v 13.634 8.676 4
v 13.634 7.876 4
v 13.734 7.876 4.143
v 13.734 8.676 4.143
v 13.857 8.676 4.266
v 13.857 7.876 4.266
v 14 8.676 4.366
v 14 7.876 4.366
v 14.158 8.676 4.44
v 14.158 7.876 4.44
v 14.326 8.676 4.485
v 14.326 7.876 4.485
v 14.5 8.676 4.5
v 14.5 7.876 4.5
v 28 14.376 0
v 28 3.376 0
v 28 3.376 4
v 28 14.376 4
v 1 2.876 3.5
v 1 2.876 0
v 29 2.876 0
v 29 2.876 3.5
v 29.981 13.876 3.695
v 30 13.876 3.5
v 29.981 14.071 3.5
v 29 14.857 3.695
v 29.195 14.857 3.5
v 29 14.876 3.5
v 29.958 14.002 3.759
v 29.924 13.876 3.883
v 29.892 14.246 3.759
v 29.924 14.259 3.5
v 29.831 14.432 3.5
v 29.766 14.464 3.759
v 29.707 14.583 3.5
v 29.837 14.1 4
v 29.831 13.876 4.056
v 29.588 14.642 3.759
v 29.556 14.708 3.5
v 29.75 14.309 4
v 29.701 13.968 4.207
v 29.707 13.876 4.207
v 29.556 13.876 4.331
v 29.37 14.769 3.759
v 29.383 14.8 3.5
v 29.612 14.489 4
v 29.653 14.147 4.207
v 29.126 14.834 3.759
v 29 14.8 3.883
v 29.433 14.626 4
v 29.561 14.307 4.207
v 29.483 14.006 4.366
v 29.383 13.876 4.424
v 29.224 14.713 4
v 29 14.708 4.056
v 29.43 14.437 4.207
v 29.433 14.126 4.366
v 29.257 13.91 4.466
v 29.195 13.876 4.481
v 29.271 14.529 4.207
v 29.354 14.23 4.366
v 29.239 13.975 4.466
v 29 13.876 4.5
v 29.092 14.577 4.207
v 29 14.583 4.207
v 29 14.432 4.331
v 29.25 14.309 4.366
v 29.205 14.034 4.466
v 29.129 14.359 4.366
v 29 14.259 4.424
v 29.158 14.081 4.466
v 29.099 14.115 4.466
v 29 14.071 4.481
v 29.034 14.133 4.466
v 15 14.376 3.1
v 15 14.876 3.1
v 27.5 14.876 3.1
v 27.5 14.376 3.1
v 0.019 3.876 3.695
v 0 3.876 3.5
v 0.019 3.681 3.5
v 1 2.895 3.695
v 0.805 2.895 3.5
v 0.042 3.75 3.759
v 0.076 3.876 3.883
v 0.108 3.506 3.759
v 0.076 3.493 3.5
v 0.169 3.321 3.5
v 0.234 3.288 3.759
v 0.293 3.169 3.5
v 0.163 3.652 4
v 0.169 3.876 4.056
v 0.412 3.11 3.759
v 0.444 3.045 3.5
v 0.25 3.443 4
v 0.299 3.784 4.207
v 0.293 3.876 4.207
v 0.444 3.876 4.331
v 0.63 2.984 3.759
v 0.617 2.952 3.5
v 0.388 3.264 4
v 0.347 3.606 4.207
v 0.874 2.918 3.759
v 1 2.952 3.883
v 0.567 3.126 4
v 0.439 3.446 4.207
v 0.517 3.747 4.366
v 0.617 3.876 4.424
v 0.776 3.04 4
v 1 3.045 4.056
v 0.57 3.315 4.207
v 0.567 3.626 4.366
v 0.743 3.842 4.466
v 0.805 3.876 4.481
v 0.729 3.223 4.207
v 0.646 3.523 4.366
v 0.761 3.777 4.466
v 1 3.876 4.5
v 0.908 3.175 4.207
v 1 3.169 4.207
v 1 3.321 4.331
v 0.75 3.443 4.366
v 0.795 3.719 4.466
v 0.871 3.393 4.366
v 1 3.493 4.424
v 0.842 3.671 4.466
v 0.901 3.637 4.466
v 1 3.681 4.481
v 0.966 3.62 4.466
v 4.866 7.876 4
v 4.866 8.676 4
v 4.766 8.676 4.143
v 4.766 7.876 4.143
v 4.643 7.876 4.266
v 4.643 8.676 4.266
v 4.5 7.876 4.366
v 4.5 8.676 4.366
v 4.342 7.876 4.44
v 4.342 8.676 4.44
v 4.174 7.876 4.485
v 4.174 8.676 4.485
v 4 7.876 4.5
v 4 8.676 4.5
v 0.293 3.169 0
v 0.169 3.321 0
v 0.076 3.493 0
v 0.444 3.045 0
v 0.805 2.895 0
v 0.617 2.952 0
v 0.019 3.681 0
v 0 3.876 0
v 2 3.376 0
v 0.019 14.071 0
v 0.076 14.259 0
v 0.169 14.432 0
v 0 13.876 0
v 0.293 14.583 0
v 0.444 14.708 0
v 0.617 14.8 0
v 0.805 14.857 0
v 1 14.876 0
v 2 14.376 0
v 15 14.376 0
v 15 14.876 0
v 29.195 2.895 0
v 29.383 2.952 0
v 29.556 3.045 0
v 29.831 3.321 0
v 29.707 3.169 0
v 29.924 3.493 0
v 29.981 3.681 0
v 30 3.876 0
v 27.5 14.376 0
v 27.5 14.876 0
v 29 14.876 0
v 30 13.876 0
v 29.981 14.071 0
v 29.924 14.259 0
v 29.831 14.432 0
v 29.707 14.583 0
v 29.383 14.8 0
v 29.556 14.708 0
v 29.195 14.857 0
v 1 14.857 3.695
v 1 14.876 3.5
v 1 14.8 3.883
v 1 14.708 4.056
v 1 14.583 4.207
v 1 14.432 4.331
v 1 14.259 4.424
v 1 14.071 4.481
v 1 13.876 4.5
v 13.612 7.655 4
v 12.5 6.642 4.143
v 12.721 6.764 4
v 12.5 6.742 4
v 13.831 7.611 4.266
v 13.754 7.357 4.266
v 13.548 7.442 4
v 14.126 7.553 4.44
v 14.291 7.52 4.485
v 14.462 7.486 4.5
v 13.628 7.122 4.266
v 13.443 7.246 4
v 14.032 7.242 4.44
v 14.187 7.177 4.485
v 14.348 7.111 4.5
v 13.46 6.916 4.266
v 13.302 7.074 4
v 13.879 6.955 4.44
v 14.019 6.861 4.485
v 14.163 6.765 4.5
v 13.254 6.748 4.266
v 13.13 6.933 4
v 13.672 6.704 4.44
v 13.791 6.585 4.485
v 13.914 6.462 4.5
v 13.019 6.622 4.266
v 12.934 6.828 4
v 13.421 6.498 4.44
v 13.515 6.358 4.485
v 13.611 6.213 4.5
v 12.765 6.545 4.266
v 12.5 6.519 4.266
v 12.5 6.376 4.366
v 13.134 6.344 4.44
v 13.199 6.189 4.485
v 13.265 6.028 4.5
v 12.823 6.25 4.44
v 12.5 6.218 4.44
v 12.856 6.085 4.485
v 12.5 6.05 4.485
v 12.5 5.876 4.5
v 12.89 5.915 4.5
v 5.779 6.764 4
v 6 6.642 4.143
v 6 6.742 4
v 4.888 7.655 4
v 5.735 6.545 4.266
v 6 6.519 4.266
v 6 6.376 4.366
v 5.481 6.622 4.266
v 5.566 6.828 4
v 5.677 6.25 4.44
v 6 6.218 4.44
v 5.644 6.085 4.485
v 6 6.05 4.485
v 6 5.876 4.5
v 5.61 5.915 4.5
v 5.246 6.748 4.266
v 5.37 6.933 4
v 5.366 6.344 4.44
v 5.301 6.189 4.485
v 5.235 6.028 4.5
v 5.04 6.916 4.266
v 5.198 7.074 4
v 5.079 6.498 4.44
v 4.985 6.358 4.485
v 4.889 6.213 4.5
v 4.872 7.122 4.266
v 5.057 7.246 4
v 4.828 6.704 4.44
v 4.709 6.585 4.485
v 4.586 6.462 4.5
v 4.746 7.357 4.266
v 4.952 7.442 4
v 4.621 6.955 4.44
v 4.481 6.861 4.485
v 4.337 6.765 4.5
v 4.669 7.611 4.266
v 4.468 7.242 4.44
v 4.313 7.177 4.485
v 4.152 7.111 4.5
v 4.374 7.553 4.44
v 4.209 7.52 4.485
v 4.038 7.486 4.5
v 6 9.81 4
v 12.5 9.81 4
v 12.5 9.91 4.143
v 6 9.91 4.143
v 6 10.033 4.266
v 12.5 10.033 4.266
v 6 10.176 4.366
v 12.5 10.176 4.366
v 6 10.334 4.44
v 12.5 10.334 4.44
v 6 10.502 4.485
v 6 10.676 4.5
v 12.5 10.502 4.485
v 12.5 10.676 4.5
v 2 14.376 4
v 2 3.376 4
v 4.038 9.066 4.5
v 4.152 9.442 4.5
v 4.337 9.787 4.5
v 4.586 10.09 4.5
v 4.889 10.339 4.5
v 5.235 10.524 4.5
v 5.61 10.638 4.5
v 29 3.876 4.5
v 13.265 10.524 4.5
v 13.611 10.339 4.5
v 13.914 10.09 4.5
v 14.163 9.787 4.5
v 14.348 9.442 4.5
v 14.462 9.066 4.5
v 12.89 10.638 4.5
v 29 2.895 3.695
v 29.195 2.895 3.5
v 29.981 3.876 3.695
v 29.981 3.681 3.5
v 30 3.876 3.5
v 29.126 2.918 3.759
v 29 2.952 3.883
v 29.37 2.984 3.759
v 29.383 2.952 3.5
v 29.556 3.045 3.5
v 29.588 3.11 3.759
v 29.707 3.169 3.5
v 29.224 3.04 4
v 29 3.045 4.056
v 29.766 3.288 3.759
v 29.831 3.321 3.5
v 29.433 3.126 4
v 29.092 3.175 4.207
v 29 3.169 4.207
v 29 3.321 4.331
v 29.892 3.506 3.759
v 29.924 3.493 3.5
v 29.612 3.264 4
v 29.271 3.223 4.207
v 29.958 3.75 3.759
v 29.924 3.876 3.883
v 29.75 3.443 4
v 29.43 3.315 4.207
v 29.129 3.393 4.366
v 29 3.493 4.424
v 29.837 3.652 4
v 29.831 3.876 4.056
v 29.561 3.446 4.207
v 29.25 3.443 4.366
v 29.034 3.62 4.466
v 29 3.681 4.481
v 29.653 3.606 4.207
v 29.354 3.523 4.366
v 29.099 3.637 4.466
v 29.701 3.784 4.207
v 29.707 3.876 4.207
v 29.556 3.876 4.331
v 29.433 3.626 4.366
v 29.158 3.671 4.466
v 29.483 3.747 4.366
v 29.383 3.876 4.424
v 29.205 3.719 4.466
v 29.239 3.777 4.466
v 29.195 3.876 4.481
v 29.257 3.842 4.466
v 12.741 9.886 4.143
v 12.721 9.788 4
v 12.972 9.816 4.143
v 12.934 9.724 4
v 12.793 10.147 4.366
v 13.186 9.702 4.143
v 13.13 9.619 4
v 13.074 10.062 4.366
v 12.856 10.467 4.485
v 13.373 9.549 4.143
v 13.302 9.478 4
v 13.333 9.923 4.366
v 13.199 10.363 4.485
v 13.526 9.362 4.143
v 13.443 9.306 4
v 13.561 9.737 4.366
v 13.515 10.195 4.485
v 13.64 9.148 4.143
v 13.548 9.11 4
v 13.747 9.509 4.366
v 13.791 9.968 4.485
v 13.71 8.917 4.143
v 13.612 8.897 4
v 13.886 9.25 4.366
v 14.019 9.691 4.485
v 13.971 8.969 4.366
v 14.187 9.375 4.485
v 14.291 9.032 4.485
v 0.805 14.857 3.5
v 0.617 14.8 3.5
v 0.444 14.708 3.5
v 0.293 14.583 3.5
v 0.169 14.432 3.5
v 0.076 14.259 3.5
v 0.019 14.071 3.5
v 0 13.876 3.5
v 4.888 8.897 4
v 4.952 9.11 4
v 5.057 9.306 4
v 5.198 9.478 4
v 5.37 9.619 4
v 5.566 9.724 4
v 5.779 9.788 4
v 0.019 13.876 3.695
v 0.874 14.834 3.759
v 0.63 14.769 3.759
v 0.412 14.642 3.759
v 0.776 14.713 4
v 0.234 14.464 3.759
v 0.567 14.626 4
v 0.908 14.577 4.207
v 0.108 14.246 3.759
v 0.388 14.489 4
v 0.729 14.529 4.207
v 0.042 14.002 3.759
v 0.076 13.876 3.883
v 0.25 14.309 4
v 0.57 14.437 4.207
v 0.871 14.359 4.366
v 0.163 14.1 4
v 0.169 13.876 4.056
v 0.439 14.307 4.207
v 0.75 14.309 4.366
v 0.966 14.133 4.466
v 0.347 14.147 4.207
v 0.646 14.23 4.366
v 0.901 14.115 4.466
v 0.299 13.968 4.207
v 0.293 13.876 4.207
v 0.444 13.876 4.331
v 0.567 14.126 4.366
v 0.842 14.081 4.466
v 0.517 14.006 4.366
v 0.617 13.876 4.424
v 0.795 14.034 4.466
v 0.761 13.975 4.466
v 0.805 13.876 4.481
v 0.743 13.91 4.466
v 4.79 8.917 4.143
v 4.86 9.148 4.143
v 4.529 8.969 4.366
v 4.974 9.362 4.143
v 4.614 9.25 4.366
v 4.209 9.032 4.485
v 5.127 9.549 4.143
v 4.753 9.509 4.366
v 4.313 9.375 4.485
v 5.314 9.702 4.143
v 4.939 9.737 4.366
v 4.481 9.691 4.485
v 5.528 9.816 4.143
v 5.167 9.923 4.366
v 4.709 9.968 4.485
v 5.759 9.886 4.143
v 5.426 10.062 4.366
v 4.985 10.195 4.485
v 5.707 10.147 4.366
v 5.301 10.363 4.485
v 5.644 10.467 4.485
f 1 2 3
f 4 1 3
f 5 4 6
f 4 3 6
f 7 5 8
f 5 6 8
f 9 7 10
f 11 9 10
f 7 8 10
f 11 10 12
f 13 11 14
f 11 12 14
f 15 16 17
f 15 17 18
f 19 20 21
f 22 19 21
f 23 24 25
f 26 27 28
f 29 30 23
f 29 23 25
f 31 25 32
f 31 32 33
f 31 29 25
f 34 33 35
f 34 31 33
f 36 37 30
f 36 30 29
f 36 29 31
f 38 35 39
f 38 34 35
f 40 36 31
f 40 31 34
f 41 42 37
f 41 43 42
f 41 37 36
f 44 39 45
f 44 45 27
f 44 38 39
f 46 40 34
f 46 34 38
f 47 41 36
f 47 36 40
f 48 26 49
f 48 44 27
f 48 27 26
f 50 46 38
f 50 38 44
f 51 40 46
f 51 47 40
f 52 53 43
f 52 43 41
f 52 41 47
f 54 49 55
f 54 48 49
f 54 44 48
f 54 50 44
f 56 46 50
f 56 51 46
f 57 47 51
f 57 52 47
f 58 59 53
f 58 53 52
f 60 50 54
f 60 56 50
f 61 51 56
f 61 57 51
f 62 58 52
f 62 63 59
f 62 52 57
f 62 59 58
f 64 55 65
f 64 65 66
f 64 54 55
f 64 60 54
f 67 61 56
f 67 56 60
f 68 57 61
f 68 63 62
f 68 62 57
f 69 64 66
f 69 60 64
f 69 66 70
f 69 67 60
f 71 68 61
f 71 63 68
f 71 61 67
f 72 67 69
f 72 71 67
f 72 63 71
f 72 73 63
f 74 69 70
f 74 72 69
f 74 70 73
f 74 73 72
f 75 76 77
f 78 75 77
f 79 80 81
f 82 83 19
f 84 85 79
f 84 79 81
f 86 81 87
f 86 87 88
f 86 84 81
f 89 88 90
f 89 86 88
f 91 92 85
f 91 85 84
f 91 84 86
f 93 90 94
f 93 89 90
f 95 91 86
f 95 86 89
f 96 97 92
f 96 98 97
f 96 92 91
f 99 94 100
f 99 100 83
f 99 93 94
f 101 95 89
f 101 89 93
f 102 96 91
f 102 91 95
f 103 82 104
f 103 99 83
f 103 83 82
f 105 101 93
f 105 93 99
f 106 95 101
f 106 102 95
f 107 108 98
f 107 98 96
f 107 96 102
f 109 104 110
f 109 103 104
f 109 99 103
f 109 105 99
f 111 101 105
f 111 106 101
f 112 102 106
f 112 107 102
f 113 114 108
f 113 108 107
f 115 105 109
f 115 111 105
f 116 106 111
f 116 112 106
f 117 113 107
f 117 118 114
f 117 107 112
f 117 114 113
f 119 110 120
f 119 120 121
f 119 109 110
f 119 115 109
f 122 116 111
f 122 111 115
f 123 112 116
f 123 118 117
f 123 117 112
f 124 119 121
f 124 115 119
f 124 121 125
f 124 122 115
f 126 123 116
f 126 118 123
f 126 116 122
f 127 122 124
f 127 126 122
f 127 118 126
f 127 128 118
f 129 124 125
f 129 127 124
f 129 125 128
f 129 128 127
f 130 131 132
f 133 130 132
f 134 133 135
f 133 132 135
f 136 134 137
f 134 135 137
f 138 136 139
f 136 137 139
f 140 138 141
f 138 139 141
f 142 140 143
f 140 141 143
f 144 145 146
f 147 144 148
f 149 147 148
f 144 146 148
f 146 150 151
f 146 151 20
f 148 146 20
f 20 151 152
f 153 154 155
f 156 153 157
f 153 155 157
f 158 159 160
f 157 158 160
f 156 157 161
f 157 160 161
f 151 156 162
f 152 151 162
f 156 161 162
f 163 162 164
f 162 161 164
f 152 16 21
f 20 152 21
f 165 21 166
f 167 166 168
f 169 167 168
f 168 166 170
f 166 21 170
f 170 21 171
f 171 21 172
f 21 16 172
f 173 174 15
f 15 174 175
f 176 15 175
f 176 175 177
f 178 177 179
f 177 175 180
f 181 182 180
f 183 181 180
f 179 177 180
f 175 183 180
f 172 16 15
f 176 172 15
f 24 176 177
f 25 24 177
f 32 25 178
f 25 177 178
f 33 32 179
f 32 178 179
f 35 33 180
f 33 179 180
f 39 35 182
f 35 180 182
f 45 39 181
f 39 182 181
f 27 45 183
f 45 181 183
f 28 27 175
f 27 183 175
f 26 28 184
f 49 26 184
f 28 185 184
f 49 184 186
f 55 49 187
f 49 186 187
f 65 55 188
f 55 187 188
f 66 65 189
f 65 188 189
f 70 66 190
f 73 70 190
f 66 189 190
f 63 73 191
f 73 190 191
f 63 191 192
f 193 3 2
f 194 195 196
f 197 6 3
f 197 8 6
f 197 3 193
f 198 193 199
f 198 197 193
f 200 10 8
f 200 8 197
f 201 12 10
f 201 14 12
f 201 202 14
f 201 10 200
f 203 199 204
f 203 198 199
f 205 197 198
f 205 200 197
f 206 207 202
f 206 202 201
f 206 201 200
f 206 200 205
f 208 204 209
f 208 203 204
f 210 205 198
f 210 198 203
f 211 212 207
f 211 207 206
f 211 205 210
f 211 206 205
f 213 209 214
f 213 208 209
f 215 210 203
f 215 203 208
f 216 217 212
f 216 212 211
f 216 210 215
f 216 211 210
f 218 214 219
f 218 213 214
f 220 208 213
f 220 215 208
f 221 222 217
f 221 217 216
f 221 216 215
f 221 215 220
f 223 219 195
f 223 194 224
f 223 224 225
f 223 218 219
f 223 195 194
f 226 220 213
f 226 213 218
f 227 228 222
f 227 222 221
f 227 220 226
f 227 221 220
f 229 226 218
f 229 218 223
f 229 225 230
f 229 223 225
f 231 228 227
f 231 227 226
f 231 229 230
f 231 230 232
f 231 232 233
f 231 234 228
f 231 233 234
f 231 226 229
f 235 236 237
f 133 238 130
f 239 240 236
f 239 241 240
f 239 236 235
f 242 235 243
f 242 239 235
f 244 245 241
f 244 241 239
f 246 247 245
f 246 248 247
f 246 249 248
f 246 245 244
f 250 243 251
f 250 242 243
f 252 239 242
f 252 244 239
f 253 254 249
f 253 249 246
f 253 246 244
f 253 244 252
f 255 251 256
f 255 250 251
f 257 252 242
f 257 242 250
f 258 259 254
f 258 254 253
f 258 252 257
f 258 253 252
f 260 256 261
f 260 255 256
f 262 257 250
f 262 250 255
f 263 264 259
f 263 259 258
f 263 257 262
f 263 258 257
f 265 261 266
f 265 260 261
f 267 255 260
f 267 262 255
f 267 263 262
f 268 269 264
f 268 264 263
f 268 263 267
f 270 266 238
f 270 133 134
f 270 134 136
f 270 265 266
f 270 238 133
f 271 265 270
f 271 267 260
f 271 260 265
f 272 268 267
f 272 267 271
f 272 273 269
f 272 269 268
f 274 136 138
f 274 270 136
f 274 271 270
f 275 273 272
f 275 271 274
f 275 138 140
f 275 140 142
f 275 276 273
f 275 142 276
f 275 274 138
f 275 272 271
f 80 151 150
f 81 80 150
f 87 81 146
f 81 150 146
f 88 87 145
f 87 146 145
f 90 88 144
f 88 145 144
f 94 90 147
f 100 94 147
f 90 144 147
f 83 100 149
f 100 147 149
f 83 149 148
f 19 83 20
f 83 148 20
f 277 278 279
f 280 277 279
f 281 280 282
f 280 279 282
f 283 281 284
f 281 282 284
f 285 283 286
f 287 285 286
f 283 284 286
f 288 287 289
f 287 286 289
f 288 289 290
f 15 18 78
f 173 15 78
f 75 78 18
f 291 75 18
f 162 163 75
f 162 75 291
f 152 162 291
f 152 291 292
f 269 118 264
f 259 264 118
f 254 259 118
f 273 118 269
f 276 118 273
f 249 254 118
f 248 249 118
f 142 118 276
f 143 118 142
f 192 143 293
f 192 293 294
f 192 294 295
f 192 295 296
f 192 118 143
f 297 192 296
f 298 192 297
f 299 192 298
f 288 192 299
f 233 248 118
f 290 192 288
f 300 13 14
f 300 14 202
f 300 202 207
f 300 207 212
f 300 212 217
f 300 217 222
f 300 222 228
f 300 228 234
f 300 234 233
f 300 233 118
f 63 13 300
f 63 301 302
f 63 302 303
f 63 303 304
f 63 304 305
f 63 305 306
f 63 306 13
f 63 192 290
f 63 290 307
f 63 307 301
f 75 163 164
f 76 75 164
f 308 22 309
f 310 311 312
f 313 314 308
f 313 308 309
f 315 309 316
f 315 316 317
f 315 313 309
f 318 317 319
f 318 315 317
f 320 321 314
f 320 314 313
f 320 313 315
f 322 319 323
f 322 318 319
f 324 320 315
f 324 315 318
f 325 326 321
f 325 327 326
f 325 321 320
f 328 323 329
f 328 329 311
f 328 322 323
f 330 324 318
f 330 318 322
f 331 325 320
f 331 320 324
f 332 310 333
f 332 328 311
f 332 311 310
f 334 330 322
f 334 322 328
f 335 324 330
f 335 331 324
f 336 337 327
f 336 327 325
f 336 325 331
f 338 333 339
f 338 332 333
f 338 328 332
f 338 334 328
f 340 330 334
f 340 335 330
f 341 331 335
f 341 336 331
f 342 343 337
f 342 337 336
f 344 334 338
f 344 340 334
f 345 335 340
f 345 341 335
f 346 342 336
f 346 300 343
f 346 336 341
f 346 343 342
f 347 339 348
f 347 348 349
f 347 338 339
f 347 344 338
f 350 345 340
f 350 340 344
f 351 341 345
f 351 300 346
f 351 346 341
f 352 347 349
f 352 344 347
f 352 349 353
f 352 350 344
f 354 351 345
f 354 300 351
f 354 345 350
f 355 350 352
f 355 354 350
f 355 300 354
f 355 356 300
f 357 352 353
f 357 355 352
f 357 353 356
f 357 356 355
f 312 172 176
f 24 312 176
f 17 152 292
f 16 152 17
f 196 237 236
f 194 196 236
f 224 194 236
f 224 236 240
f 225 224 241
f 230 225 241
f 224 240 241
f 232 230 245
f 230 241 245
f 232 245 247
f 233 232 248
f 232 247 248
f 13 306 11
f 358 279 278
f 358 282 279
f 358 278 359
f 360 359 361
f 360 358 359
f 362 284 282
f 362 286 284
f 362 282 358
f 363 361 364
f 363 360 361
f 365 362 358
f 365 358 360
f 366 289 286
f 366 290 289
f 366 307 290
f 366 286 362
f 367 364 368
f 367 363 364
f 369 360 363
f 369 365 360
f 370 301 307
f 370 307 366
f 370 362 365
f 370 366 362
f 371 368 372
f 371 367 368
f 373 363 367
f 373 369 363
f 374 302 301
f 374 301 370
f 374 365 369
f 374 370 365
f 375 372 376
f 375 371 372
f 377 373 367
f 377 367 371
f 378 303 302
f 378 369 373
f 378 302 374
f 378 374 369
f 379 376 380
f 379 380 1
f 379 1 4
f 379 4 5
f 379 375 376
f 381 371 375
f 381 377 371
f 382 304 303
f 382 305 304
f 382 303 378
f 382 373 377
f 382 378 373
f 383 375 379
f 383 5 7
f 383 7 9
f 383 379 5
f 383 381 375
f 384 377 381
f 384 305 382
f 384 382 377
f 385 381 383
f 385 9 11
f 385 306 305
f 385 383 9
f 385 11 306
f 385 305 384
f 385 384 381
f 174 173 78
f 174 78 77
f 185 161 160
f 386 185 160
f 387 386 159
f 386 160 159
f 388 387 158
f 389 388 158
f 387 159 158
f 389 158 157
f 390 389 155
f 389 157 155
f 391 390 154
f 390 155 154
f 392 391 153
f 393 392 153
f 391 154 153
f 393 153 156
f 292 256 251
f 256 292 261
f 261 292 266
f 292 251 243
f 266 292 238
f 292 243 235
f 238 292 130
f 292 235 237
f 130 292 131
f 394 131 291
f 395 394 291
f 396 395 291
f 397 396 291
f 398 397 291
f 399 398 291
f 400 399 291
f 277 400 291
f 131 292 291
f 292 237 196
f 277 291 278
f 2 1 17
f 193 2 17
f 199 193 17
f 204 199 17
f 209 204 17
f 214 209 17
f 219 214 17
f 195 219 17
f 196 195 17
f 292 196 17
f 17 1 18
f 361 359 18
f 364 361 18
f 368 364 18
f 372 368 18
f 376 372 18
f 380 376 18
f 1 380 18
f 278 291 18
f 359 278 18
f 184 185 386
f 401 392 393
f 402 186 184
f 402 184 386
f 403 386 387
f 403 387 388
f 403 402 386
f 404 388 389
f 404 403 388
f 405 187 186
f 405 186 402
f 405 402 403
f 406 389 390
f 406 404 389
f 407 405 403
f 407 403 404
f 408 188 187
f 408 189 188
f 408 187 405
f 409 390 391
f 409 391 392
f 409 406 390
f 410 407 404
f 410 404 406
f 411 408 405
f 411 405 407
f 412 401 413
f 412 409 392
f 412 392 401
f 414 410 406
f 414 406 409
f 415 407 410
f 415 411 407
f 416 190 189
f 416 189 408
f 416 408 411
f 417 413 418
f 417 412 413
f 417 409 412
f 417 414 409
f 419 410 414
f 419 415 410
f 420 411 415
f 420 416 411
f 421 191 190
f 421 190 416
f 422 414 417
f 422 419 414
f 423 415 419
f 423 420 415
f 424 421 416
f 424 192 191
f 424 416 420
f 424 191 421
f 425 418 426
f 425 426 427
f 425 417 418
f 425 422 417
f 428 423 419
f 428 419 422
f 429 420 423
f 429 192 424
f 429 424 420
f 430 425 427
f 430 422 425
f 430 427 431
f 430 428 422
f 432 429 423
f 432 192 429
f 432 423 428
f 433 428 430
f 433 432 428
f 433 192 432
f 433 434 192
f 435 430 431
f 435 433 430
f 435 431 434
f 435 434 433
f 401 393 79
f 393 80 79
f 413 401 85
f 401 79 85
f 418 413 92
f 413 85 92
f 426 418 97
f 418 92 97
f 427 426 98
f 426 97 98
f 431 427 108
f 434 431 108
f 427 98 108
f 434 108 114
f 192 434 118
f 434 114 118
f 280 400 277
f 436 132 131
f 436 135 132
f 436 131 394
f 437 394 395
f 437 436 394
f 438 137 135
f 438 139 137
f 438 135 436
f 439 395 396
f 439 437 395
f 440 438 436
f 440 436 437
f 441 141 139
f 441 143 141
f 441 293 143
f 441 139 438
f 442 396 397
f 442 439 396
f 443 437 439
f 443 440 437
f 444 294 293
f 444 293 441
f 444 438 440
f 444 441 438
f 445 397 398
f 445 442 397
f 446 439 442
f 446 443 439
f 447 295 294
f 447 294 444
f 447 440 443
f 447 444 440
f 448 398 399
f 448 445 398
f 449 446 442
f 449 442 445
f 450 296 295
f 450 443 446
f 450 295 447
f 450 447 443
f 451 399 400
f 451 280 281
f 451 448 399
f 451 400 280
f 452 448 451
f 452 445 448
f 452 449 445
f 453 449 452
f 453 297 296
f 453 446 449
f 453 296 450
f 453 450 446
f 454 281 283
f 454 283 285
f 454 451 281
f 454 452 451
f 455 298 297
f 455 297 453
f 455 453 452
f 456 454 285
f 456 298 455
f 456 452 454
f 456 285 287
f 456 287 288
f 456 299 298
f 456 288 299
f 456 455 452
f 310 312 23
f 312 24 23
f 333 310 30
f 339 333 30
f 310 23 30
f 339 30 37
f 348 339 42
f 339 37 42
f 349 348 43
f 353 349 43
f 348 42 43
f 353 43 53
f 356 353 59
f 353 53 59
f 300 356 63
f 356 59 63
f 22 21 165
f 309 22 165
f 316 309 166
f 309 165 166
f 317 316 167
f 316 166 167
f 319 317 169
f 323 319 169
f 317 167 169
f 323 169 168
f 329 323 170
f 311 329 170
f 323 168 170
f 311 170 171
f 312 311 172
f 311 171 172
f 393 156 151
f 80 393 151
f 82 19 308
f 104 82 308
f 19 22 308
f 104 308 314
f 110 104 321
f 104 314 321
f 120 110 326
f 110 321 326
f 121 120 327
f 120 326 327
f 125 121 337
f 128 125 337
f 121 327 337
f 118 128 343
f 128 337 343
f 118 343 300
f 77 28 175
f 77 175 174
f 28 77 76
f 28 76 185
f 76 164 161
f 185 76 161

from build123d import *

# Parameters (mm, degrees)
F1_DEPTH = 4.5
F2_R     = 1
F4_DEPTH = 4
F5_W     = 12.5
F5_H     = 2.9783394848
F6_DEPTH = 3.1


with BuildPart() as f1:
    # F0 (on Top) → F1 (new body)
    with BuildSketch(Plane.XY):
        with BuildLine():
            ThreePointArc((0, 3.8761399509), (0.2928932188, 3.1690331698), (1, 2.8761399509))
            Line((1, 2.8761399509), (29, 2.8761399509))
            ThreePointArc((29, 2.8761399509), (29.7071067812, 3.1690331698), (30, 3.8761399509))
            Line((30, 3.8761399509), (30, 13.8761399509))
            ThreePointArc((30, 13.8761399509), (29.7071067812, 14.5832467321), (29, 14.8761399509))
            Line((29, 14.8761399509), (1, 14.8761399509))
            ThreePointArc((1, 14.8761399509), (0.2928932188, 14.5832467321), (0, 13.8761399509))
            Line((0, 13.8761399509), (0, 3.8761399509))
        make_face()
        with BuildLine():
            ThreePointArc((5, 8.6761399509), (5.2928932188, 9.3832467321), (6, 9.6761399509))
            Line((6, 9.6761399509), (12.5, 9.6761399509))
            ThreePointArc((12.5, 9.6761399509), (13.2071067812, 9.3832467321), (13.5, 8.6761399509))
            Line((13.5, 8.6761399509), (13.5, 7.8761399509))
            ThreePointArc((13.5, 7.8761399509), (13.2071067812, 7.1690331698), (12.5, 6.8761399509))
            Line((12.5, 6.8761399509), (6, 6.8761399509))
            ThreePointArc((6, 6.8761399509), (5.2928932188, 7.1690331698), (5, 7.8761399509))
            Line((5, 7.8761399509), (5, 8.6761399509))
        make_face(mode=Mode.SUBTRACT)
    extrude(amount=F1_DEPTH)

    # F2
    f2_edges = [f1.edges().sort_by_distance(p)[0] for p in [
        (0.292893, 3.169033, 4.5),
        (15, 2.87614, 4.5),
        (29.707107, 3.169033, 4.5),
        (30, 8.87614, 4.5),
        (29.707107, 14.583247, 4.5),
        (15, 14.87614, 4.5),
        (0.292893, 14.583247, 4.5),
        (0, 8.87614, 4.5),
        (5.292893, 9.383247, 4.5),
        (9.25, 9.67614, 4.5),
        (13.207107, 9.383247, 4.5),
        (13.5, 8.27614, 4.5),
        (13.207107, 7.169033, 4.5),
        (9.25, 6.87614, 4.5),
        (5.292893, 7.169033, 4.5),
        (5, 8.27614, 4.5),
    ]]
    fillet(f2_edges, radius=F2_R)

    # F3 (on Top) → F4 (cut)
    with BuildSketch(Plane.XY):
        Polygon((28, 3.3761399509), (28, 14.3761399509), (2, 14.3761399509), (2, 3.3761399509), (14.5, 3.3761399509), (27, 3.3761399509), align=None)
    extrude(amount=F4_DEPTH, mode=Mode.SUBTRACT)

    # F5 (on Top) → F6 (cut)
    with BuildSketch(Plane.XY):
        with Locations((21.25, 14.7778680548)):
            Rectangle(F5_W, F5_H)
    extrude(amount=F6_DEPTH, mode=Mode.SUBTRACT)


solid = f1.part
